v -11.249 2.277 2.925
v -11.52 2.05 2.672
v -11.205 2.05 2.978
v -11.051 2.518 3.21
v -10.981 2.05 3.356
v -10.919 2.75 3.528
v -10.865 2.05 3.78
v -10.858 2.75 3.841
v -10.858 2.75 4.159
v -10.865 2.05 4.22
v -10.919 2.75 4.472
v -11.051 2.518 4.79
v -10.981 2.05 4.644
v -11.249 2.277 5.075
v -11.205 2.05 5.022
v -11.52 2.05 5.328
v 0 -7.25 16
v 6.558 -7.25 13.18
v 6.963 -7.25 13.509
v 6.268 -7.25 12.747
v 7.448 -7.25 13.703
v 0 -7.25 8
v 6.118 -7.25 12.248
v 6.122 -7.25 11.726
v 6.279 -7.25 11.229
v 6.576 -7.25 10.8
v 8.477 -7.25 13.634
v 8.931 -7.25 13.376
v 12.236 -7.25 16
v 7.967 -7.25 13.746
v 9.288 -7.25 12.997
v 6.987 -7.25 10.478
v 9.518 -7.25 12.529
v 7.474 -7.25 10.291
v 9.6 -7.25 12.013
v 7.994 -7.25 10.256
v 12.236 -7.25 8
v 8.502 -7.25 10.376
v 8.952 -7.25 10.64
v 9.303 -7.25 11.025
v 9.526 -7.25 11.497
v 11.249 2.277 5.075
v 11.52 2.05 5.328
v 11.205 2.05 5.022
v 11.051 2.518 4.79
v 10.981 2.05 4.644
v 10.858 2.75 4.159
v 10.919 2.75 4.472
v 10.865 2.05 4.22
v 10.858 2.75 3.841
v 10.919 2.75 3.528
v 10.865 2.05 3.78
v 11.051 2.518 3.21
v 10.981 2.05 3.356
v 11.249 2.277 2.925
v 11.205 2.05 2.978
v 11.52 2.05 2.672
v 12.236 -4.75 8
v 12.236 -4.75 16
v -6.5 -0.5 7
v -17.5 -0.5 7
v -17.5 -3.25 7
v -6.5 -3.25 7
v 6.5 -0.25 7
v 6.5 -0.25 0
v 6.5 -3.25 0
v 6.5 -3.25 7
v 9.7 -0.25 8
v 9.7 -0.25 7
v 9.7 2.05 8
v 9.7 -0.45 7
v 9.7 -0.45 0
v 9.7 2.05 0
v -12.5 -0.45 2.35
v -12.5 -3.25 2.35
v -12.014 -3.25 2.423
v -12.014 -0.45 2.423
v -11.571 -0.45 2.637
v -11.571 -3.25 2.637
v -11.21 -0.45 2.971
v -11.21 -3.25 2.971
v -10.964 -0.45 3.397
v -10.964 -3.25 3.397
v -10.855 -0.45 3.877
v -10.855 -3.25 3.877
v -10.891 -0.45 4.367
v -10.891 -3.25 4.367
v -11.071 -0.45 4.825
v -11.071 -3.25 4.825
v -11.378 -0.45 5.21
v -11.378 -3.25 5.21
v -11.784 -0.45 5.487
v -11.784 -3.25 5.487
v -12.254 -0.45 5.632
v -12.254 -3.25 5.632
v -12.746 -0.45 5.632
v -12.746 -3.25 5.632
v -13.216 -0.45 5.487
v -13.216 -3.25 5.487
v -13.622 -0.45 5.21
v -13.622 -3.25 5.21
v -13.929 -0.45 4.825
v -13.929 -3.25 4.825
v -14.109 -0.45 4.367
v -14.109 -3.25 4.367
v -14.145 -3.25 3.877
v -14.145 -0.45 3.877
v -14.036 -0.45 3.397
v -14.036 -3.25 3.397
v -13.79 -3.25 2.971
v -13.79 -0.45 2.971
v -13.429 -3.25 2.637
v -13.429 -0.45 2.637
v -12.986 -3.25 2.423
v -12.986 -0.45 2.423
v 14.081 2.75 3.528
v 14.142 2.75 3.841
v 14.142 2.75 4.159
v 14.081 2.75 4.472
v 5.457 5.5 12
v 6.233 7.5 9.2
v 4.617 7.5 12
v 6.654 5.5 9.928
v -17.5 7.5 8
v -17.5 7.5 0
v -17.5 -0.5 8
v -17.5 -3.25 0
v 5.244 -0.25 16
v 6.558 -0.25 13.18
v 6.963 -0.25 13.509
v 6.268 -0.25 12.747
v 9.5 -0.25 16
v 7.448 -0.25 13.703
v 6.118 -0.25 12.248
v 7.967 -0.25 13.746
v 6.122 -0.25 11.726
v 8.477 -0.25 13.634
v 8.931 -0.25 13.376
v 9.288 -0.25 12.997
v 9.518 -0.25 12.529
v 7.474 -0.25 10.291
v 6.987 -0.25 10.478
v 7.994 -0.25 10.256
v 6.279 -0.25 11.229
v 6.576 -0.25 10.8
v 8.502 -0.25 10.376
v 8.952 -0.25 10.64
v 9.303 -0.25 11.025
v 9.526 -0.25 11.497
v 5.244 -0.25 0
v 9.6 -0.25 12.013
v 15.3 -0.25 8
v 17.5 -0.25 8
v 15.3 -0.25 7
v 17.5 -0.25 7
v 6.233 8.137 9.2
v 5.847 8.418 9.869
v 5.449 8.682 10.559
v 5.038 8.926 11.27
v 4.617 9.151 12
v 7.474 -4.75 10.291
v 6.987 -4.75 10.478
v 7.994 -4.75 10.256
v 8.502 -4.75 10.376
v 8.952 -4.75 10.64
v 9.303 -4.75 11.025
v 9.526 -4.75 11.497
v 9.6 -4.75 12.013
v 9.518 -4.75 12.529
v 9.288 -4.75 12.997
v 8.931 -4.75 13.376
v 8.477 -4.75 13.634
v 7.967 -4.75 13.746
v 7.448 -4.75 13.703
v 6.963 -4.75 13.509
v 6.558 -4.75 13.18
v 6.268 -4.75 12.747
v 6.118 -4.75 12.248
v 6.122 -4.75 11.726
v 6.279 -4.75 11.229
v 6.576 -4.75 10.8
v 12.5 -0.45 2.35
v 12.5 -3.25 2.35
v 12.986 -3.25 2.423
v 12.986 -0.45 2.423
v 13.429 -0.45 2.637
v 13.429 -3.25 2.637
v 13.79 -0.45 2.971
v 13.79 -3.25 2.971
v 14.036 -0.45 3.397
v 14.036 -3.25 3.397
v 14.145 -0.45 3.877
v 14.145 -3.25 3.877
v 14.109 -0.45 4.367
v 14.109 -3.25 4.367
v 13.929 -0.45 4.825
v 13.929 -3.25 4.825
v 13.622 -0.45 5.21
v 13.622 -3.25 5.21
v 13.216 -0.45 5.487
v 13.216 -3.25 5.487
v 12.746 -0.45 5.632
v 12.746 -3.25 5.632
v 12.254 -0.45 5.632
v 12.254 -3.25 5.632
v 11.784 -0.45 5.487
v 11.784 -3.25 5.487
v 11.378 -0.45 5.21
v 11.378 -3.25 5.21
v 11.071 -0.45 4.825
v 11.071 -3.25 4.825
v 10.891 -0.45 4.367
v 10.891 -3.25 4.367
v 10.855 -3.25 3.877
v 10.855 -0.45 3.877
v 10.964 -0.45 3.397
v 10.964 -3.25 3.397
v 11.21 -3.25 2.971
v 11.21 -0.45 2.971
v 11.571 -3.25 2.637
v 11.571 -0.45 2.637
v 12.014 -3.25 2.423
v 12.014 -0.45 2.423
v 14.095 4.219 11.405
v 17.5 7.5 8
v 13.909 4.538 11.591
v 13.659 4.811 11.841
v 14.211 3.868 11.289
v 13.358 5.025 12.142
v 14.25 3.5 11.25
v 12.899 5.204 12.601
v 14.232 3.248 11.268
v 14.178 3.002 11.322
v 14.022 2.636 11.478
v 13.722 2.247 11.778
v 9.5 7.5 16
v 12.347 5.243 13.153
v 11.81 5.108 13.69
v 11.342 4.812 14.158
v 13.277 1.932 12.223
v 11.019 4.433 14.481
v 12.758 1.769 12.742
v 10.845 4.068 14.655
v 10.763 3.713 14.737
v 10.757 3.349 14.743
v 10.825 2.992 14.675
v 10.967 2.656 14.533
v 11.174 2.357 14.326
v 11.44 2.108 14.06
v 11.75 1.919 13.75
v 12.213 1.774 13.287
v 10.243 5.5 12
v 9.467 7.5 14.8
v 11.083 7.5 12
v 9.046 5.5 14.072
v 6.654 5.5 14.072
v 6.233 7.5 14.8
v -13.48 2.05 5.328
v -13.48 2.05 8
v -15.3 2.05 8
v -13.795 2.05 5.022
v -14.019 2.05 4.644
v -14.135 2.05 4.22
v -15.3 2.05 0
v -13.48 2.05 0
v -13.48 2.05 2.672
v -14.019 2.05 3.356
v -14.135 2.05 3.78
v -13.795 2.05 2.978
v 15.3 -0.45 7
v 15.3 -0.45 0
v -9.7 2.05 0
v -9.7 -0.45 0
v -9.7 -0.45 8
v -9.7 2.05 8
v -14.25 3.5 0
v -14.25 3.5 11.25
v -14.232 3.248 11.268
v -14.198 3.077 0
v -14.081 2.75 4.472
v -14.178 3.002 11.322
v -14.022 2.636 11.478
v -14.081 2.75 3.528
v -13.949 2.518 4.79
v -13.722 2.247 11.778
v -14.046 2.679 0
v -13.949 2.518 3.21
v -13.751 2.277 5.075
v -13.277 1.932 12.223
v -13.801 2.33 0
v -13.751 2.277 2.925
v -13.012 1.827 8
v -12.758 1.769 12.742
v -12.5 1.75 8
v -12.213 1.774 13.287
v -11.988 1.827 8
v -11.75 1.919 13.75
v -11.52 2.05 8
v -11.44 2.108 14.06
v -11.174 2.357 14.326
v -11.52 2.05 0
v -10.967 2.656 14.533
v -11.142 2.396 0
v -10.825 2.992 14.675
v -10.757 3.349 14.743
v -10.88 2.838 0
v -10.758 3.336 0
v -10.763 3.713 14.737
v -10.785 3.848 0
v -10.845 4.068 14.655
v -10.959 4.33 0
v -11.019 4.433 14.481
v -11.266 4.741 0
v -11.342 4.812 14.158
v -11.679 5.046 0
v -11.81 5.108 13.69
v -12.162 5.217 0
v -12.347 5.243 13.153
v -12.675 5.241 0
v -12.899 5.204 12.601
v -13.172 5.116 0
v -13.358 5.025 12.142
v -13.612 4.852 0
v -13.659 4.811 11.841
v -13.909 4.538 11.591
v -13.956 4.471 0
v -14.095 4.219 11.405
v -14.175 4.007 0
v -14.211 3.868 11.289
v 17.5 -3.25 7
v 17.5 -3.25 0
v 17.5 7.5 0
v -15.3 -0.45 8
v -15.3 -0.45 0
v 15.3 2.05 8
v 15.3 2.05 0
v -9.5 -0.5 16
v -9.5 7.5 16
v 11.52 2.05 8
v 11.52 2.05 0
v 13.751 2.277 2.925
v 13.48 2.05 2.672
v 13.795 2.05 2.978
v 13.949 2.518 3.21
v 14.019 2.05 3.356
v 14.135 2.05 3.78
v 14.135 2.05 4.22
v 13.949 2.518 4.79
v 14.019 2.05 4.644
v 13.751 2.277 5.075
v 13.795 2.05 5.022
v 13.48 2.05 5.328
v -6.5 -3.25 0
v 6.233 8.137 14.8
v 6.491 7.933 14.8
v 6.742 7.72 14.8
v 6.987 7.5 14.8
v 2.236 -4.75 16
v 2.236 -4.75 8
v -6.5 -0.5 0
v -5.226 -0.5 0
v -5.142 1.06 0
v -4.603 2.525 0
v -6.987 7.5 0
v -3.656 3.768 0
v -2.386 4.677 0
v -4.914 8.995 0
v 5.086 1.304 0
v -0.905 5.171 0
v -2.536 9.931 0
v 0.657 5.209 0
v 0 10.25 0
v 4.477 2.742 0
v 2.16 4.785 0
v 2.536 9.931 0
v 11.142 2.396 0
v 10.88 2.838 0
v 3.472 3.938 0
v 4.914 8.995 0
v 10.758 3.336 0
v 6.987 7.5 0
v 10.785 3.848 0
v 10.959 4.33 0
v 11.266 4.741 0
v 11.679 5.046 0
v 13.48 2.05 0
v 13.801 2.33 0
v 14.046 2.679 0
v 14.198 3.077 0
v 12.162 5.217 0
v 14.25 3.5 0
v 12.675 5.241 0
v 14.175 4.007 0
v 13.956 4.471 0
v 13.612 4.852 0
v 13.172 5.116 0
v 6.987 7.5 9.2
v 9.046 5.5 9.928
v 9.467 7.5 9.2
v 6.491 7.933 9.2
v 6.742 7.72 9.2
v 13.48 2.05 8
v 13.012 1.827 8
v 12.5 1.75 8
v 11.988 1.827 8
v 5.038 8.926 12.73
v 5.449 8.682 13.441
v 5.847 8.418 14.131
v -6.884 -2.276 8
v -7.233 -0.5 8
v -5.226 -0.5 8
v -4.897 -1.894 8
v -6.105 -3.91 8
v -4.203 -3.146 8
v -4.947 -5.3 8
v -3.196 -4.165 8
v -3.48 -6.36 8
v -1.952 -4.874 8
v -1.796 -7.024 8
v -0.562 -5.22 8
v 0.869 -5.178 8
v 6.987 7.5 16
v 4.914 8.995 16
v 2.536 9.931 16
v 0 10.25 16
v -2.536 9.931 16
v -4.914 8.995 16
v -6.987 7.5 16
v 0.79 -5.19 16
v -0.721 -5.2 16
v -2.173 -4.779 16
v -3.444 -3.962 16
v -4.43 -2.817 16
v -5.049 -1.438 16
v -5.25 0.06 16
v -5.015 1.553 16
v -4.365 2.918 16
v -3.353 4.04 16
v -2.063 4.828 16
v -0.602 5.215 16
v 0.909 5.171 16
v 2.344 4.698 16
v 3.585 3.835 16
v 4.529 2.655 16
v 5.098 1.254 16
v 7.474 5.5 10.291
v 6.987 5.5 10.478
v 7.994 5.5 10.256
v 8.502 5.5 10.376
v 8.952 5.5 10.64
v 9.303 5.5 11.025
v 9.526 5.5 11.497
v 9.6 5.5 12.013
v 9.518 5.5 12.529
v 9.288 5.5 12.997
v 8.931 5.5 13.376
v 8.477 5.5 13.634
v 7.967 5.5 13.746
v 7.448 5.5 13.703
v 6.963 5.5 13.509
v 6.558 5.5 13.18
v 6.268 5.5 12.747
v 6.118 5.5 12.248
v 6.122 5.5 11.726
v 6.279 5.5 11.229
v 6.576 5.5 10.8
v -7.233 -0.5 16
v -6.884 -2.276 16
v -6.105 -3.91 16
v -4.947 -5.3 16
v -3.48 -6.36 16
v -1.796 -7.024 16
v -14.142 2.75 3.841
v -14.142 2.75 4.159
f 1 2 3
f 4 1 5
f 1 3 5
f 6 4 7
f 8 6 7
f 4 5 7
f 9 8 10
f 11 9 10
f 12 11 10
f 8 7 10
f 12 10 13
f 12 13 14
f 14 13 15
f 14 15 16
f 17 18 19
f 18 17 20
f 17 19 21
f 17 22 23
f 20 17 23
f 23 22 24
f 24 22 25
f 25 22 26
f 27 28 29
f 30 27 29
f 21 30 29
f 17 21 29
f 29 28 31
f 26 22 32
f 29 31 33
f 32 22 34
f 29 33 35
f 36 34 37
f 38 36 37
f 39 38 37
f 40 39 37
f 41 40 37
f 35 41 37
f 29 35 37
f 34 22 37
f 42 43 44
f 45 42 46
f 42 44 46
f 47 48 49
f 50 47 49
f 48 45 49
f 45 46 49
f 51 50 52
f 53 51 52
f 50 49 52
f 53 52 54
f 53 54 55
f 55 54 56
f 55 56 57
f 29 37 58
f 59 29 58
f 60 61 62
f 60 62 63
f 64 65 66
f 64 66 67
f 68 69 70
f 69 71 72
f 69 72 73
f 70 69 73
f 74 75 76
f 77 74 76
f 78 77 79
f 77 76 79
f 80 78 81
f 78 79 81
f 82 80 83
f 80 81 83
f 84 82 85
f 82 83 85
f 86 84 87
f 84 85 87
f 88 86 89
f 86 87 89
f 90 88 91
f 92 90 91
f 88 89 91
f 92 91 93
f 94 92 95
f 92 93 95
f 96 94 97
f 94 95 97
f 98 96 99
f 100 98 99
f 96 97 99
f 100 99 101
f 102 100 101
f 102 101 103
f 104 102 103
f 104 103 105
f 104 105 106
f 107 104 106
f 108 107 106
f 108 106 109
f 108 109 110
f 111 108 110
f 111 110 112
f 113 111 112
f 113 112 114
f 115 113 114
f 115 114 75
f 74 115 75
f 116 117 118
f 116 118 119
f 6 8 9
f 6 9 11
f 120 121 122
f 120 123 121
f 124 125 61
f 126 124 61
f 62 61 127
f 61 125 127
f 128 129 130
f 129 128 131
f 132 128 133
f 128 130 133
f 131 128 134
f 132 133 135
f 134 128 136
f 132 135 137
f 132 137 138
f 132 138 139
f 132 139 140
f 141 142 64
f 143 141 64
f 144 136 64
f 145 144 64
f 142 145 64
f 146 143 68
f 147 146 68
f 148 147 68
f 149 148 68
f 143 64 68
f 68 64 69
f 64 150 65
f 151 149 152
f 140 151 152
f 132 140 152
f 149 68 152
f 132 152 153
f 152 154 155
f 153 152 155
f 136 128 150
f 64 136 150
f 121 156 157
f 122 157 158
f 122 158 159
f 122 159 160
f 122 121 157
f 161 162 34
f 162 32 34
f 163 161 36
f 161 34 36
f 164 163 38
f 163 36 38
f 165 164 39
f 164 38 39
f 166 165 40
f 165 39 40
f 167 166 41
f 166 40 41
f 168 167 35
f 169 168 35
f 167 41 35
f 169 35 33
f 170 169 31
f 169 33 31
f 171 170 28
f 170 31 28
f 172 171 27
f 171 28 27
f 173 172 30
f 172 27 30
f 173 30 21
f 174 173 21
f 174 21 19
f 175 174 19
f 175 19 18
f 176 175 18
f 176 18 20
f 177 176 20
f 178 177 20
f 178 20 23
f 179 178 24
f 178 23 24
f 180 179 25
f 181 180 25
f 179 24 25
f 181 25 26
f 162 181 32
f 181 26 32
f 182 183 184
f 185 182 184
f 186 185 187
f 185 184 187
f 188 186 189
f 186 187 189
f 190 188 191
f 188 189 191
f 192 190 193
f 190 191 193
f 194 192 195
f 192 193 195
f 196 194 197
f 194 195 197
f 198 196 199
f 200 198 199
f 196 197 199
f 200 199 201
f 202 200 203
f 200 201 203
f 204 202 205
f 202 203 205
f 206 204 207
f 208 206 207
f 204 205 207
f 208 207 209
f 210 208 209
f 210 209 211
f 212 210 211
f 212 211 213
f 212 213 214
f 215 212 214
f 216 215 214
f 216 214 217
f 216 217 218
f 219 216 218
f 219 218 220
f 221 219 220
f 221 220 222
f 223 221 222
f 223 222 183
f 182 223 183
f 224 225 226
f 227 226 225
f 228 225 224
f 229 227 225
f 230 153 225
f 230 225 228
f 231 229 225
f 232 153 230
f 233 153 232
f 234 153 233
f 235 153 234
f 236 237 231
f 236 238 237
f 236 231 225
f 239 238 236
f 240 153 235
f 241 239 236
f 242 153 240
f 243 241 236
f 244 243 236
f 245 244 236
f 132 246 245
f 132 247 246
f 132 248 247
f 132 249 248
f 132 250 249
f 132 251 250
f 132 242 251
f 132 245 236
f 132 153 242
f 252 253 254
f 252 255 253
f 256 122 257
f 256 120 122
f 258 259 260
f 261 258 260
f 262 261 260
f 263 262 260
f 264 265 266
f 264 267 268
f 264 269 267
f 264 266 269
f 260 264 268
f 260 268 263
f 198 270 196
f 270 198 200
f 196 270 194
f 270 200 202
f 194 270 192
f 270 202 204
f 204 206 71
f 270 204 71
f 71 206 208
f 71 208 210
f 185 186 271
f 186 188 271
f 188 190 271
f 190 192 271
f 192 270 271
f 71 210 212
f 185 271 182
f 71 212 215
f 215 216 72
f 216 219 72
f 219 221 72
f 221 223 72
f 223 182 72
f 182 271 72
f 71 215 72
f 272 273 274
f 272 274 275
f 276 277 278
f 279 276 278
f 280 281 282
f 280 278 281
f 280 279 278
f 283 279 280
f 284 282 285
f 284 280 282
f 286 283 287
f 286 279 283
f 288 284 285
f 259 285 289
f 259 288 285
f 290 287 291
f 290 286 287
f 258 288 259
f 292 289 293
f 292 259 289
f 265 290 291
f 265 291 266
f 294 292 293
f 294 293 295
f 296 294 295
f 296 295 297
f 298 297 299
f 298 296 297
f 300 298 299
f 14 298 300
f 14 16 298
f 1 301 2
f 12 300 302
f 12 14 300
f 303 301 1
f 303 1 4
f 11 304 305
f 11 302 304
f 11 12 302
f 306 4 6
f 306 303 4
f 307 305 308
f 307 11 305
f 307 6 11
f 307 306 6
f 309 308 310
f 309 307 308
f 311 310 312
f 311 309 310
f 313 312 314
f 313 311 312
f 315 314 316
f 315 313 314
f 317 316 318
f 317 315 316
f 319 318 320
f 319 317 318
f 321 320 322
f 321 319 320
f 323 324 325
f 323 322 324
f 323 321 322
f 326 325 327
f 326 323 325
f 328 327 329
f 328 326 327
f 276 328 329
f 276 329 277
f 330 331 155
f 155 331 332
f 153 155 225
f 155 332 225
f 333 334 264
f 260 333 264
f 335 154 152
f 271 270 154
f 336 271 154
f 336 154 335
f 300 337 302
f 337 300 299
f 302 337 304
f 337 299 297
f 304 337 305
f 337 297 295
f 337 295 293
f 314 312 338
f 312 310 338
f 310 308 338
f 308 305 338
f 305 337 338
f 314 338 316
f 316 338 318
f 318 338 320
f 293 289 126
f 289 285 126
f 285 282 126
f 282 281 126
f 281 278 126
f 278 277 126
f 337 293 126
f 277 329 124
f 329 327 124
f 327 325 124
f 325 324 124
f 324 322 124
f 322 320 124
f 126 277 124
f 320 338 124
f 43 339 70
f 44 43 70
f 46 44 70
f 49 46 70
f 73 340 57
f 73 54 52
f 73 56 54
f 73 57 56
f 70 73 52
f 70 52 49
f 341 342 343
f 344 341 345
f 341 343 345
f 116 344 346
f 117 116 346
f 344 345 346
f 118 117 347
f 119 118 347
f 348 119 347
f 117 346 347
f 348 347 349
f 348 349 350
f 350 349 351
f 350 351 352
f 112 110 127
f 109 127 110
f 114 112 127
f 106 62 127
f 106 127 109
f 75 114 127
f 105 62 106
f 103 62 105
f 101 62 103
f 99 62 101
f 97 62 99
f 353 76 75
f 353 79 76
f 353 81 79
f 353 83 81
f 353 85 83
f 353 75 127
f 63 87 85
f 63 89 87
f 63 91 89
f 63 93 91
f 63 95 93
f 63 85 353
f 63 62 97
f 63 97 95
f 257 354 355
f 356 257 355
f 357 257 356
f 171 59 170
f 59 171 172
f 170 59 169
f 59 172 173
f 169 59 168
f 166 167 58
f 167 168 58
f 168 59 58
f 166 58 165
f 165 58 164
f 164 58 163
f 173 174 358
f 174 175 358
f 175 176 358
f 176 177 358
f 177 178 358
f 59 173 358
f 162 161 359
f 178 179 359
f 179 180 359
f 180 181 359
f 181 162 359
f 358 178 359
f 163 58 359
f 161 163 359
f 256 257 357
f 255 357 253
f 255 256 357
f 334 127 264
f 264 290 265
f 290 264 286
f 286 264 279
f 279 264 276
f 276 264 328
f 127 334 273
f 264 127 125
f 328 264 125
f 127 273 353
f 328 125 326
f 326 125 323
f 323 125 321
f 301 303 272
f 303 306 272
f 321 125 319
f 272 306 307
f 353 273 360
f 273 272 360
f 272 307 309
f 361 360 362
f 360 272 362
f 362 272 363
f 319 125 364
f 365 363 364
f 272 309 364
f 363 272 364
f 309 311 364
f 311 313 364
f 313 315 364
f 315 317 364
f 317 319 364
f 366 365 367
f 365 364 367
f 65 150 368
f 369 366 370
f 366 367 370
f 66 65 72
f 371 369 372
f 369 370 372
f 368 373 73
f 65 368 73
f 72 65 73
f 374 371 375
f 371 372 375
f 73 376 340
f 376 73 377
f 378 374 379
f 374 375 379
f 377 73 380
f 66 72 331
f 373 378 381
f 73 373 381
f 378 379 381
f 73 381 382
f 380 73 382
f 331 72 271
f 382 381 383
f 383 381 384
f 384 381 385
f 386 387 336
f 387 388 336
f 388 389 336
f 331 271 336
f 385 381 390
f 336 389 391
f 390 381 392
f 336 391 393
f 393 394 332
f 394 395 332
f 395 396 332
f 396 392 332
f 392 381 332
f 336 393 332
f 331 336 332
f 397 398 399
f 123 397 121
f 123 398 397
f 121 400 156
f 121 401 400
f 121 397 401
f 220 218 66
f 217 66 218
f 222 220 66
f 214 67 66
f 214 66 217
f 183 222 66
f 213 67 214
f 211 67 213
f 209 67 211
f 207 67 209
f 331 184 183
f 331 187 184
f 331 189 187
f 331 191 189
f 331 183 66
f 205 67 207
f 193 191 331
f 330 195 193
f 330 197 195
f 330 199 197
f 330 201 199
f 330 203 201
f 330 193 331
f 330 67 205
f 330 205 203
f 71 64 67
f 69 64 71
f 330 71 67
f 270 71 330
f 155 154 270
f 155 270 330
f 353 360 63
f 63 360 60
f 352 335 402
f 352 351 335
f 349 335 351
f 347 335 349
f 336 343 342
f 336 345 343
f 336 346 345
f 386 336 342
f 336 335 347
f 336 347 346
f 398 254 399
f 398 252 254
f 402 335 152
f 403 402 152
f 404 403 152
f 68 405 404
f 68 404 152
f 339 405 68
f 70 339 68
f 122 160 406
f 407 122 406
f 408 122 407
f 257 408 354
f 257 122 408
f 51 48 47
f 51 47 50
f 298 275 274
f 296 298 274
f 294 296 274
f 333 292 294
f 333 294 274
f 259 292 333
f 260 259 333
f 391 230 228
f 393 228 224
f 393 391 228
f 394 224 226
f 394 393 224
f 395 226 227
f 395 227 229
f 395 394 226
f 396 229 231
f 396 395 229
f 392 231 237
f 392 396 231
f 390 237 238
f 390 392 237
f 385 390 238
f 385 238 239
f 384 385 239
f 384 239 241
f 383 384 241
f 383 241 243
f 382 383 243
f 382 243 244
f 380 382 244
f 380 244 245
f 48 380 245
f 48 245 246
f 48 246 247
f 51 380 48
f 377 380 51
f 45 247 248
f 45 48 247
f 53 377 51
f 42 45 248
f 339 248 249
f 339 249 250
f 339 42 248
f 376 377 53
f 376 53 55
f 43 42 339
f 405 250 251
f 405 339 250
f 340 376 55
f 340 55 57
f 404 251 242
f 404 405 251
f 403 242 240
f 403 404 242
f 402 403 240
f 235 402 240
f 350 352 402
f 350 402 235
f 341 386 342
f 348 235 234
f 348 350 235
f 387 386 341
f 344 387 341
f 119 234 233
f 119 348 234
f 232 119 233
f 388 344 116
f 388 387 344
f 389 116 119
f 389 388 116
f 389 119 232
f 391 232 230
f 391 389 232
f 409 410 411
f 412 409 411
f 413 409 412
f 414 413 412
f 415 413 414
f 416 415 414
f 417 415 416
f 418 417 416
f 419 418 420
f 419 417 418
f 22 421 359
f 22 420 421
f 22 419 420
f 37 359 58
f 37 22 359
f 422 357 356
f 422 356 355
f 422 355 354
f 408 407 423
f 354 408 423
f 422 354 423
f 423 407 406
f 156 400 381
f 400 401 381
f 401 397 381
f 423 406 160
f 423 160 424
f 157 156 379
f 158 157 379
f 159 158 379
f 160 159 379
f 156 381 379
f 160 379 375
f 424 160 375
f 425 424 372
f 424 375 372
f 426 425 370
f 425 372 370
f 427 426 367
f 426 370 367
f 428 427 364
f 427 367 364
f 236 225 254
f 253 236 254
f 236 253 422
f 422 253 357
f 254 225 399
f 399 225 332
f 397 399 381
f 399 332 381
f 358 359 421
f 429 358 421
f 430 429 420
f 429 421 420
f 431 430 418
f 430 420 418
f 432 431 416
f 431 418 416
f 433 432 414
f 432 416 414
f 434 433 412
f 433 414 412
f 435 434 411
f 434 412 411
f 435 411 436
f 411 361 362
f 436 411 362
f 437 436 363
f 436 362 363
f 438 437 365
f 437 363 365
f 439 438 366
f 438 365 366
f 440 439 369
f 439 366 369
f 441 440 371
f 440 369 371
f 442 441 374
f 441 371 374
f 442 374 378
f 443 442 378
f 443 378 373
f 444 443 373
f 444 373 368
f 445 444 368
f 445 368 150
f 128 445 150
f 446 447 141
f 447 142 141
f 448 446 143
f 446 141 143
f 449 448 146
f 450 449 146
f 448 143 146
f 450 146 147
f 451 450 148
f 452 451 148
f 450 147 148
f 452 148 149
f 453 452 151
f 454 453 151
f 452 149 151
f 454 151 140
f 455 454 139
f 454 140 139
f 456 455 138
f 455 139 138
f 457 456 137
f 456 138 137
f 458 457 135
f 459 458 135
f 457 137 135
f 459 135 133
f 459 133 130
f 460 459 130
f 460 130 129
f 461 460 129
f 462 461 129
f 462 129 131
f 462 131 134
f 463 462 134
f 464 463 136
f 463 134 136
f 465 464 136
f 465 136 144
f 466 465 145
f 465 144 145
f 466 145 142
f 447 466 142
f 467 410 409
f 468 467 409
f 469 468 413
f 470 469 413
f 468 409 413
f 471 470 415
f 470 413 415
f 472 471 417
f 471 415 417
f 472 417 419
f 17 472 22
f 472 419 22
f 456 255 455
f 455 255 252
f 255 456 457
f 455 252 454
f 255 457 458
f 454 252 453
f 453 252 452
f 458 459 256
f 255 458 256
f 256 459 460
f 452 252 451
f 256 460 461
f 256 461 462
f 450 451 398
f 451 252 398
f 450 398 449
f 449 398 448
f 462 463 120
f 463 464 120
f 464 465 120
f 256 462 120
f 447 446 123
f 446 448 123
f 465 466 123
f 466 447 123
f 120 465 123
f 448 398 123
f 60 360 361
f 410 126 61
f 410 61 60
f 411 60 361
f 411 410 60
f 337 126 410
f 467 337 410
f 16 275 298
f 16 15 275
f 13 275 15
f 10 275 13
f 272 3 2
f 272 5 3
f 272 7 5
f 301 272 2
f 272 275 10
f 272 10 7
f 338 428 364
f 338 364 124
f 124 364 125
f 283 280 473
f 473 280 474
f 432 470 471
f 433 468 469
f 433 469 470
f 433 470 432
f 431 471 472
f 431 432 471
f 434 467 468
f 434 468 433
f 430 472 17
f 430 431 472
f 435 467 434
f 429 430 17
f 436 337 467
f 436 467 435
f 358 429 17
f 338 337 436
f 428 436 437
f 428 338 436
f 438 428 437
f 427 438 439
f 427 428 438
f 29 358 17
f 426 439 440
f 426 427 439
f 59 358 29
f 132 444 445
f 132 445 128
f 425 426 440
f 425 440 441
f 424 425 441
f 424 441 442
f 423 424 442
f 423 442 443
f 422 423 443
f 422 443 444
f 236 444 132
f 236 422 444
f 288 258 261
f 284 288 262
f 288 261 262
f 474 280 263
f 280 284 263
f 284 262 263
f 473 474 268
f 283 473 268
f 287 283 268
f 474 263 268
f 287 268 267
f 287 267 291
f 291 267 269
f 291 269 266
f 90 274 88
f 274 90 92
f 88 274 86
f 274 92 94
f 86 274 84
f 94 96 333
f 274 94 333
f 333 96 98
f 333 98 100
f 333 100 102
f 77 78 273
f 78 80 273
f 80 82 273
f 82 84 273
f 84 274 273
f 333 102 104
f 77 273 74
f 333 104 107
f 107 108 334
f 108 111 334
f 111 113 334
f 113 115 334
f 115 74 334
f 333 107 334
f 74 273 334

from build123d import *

# Parameters (mm, degrees)
ESBO_O1_R                       = 1.75
RESSALTO_EXTRUS_O1_DEPTH        = 16
ESBO_O3_R                       = 1.75
CORTE_EXTRUS_O2_DEPTH           = 30.470324057
CORTE_EXTRUS_O3_DEPTH           = 2
CORTE_EXTRUS_O3_TAPER           = 20
CORTE_EXTRUS_O3_OTHER_WAY_DEPTH = 6
CORTE_EXTRUS_O4_REACH           = 31.47
ESBO_O5_W                       = 29.879545061
ESBO_O5_H                       = 8
ESBO_O6_W                       = 11
ESBO_O6_H                       = 7
RESSALTO_EXTRUS_O2_DEPTH        = 3
ESBO_O7_W                       = 5.6
ESBO_O7_H                       = 2.5
CORTE_EXTRUS_O6_DEPTH           = 8
ESBO_O8_R                       = 1.65
CORTE_EXTRUS_O7_DEPTH           = 6
CHANFRO1_SIZE                   = 8


with BuildPart() as part:
    # Esboço1 → Ressalto-extrusão1 (new body)
    with BuildSketch(Plane.XY):
        with BuildLine():
            Line((17.5, 7.5), (6.986594306, 7.5))
            ThreePointArc((6.986594306, 7.5), (0, 10.25), (-6.986594306, 7.5))
            Line((-6.986594306, 7.5), (-17.5, 7.5))
            Line((-17.5, 7.5), (-17.5, -0.5))
            Line((-17.5, -0.5), (-7.232738071, -0.5))
            ThreePointArc((-7.232738071, -0.5), (-4.946589734, -5.300353762), (0, -7.25))
            Line((0, -7.25), (12.236067977, -7.25))
            Line((12.236067977, -7.25), (12.236067977, -4.75))
            Line((12.236067977, -4.75), (2.236067977, -4.75))
            ThreePointArc((2.236067977, -4.75), (-4.364690104, 2.917529829), (5.244044241, -0.25))
            Line((5.244044241, -0.25), (12.736067977, -0.25))
            Line((12.736067977, -0.25), (15.807189139, -0.25))
            Line((15.807189139, -0.25), (17.5, -0.25))
            Line((17.5, -0.25), (17.5, 7.5))
        make_face()
        with Locations((12.5, 3.5)):
            Circle(ESBO_O1_R, mode=Mode.SUBTRACT)
        with Locations(Location((-12.5, 3.5, 0), (0, 0, 180))):
            Circle(ESBO_O1_R, mode=Mode.SUBTRACT)
    extrude(amount=RESSALTO_EXTRUS_O1_DEPTH)

    # Esboço3 → Corte-extrusão2 (cut, through all)
    with BuildSketch(Plane.XZ.offset(7.25)):
        with Locations(Location((7.85, 12, 0), (0, 0, 240.437367967))):
            Circle(ESBO_O3_R)
    extrude(amount=-CORTE_EXTRUS_O2_DEPTH, mode=Mode.SUBTRACT)

    # Esboço4 → Corte-extrusão3 (cut)
    with BuildSketch(Plane(origin=(0, 7.5, 0), x_dir=(1, 0, 0), z_dir=(0, 1, 0))):
        Polygon((11.083161507, -12), (9.466580754, -9.2), (6.233419246, -9.2), (4.616838493, -12), (6.233419246, -14.8), (9.466580754, -14.8), align=None)
    extrude(amount=-CORTE_EXTRUS_O3_DEPTH, taper=CORTE_EXTRUS_O3_TAPER, mode=Mode.SUBTRACT)

    # Esboço4 → Corte-extrusão3 other way (cut)
    with BuildSketch(Plane(origin=(0, 7.5, 0), x_dir=(1, 0, 0), z_dir=(0, 1, 0))):
        Polygon((11.083161507, -12), (9.466580754, -9.2), (6.233419246, -9.2), (4.616838493, -12), (6.233419246, -14.8), (9.466580754, -14.8), align=None)
    extrude(amount=CORTE_EXTRUS_O3_OTHER_WAY_DEPTH, mode=Mode.SUBTRACT)

    # Corte-extrusão4: up to this face of the body (flat: up to its plane)
    corte_extrus_o4_end = Plane(part.part.faces().sort_by_distance((-12.366369035, -0.5, 8))[0])
    # Esboço5 → Corte-extrusão4 (cut, up to the picked face)
    with BuildSketch(Plane.XZ.offset(7.25), mode=Mode.PRIVATE) as corte_extrus_o4_sk1:
        with Locations((-2.703704553, 4)):
            Rectangle(ESBO_O5_W, ESBO_O5_H)
    corte_extrus_o4_tool1 = split(extrude(corte_extrus_o4_sk1.sketch, amount=-CORTE_EXTRUS_O4_REACH, mode=Mode.PRIVATE), bisect_by=corte_extrus_o4_end, keep=Keep.BOTH, mode=Mode.PRIVATE)
    add(corte_extrus_o4_tool1.solids().sort_by(Axis((-2.703705, -7.25, 4), (0, 1, 0)))[0], mode=Mode.SUBTRACT)

    # Esboço6 → Ressalto-extrusão2 (add)
    with BuildSketch(Plane.XZ.offset(0.25)):
        with Locations((12, 3.5)):
            Rectangle(ESBO_O6_W, ESBO_O6_H)
        with Locations((-12, 3.5)):
            Rectangle(ESBO_O6_W, ESBO_O6_H)
    extrude(amount=RESSALTO_EXTRUS_O2_DEPTH)

    # Esboço7 → Corte-extrusão6 (cut)
    with BuildSketch(Plane(origin=(0, 0, 0), x_dir=(-1, 0, 0), z_dir=(0, 0, -1))):
        with Locations((-12.5, 0.8)):
            Rectangle(ESBO_O7_W, ESBO_O7_H)
        with Locations((12.5, 0.8)):
            Rectangle(ESBO_O7_W, ESBO_O7_H)
    extrude(amount=-CORTE_EXTRUS_O6_DEPTH, mode=Mode.SUBTRACT)

    # Esboço8 → Corte-extrusão7 (cut)
    with BuildSketch(Plane.XZ.offset(3.25)):
        with Locations(Location((12.5, 4, 0), (0, 0, 270))):
            Circle(ESBO_O8_R)
        with Locations(Location((-12.5, 4, 0), (0, 0, 270))):
            Circle(ESBO_O8_R)
    extrude(amount=-CORTE_EXTRUS_O7_DEPTH, mode=Mode.SUBTRACT)

    # Chanfro1
    # the kernel refuses this chamfer: 8 mm, written as the material it takes off along each edge
    with BuildSketch(Plane(origin=(17.5, -20.823463904, 16), x_dir=(0.027495876610586487, 0, -0.9996219169112968), z_dir=(0, 1, 0))) as chanfro1_piece_1_section:
        Polygon((CHANFRO1_SIZE * 0.999621916911, CHANFRO1_SIZE * 0.0274958766106), (-CHANFRO1_SIZE * 0.0274958766106, CHANFRO1_SIZE * 0.999621916911), (0, 0), align=None)
    chanfro1_piece_1 = extrude(amount=48.896927807, mode=Mode.PRIVATE)
    chanfro1_piece_1 = split(chanfro1_piece_1, bisect_by=Plane(origin=(15.518542318, -4.75, 12.990728841), z_dir=(0, 1, 0)), keep=Keep.TOP, mode=Mode.PRIVATE)
    add(chanfro1_piece_1, mode=Mode.SUBTRACT)
    with BuildSketch(Plane(origin=(-17.5, 28.073463904, 16), x_dir=(0.9996219169112968, 0, 0.027495876610586494), z_dir=(0, -1, 0))) as chanfro1_piece_2:
        Polygon((CHANFRO1_SIZE * 0.999621916911, -CHANFRO1_SIZE * 0.0274958766106), (-CHANFRO1_SIZE * 0.0274958766106, -CHANFRO1_SIZE * 0.999621916911), (0, 0), align=None)
    extrude(amount=49.146927807, mode=Mode.SUBTRACT)


solid = part.part
